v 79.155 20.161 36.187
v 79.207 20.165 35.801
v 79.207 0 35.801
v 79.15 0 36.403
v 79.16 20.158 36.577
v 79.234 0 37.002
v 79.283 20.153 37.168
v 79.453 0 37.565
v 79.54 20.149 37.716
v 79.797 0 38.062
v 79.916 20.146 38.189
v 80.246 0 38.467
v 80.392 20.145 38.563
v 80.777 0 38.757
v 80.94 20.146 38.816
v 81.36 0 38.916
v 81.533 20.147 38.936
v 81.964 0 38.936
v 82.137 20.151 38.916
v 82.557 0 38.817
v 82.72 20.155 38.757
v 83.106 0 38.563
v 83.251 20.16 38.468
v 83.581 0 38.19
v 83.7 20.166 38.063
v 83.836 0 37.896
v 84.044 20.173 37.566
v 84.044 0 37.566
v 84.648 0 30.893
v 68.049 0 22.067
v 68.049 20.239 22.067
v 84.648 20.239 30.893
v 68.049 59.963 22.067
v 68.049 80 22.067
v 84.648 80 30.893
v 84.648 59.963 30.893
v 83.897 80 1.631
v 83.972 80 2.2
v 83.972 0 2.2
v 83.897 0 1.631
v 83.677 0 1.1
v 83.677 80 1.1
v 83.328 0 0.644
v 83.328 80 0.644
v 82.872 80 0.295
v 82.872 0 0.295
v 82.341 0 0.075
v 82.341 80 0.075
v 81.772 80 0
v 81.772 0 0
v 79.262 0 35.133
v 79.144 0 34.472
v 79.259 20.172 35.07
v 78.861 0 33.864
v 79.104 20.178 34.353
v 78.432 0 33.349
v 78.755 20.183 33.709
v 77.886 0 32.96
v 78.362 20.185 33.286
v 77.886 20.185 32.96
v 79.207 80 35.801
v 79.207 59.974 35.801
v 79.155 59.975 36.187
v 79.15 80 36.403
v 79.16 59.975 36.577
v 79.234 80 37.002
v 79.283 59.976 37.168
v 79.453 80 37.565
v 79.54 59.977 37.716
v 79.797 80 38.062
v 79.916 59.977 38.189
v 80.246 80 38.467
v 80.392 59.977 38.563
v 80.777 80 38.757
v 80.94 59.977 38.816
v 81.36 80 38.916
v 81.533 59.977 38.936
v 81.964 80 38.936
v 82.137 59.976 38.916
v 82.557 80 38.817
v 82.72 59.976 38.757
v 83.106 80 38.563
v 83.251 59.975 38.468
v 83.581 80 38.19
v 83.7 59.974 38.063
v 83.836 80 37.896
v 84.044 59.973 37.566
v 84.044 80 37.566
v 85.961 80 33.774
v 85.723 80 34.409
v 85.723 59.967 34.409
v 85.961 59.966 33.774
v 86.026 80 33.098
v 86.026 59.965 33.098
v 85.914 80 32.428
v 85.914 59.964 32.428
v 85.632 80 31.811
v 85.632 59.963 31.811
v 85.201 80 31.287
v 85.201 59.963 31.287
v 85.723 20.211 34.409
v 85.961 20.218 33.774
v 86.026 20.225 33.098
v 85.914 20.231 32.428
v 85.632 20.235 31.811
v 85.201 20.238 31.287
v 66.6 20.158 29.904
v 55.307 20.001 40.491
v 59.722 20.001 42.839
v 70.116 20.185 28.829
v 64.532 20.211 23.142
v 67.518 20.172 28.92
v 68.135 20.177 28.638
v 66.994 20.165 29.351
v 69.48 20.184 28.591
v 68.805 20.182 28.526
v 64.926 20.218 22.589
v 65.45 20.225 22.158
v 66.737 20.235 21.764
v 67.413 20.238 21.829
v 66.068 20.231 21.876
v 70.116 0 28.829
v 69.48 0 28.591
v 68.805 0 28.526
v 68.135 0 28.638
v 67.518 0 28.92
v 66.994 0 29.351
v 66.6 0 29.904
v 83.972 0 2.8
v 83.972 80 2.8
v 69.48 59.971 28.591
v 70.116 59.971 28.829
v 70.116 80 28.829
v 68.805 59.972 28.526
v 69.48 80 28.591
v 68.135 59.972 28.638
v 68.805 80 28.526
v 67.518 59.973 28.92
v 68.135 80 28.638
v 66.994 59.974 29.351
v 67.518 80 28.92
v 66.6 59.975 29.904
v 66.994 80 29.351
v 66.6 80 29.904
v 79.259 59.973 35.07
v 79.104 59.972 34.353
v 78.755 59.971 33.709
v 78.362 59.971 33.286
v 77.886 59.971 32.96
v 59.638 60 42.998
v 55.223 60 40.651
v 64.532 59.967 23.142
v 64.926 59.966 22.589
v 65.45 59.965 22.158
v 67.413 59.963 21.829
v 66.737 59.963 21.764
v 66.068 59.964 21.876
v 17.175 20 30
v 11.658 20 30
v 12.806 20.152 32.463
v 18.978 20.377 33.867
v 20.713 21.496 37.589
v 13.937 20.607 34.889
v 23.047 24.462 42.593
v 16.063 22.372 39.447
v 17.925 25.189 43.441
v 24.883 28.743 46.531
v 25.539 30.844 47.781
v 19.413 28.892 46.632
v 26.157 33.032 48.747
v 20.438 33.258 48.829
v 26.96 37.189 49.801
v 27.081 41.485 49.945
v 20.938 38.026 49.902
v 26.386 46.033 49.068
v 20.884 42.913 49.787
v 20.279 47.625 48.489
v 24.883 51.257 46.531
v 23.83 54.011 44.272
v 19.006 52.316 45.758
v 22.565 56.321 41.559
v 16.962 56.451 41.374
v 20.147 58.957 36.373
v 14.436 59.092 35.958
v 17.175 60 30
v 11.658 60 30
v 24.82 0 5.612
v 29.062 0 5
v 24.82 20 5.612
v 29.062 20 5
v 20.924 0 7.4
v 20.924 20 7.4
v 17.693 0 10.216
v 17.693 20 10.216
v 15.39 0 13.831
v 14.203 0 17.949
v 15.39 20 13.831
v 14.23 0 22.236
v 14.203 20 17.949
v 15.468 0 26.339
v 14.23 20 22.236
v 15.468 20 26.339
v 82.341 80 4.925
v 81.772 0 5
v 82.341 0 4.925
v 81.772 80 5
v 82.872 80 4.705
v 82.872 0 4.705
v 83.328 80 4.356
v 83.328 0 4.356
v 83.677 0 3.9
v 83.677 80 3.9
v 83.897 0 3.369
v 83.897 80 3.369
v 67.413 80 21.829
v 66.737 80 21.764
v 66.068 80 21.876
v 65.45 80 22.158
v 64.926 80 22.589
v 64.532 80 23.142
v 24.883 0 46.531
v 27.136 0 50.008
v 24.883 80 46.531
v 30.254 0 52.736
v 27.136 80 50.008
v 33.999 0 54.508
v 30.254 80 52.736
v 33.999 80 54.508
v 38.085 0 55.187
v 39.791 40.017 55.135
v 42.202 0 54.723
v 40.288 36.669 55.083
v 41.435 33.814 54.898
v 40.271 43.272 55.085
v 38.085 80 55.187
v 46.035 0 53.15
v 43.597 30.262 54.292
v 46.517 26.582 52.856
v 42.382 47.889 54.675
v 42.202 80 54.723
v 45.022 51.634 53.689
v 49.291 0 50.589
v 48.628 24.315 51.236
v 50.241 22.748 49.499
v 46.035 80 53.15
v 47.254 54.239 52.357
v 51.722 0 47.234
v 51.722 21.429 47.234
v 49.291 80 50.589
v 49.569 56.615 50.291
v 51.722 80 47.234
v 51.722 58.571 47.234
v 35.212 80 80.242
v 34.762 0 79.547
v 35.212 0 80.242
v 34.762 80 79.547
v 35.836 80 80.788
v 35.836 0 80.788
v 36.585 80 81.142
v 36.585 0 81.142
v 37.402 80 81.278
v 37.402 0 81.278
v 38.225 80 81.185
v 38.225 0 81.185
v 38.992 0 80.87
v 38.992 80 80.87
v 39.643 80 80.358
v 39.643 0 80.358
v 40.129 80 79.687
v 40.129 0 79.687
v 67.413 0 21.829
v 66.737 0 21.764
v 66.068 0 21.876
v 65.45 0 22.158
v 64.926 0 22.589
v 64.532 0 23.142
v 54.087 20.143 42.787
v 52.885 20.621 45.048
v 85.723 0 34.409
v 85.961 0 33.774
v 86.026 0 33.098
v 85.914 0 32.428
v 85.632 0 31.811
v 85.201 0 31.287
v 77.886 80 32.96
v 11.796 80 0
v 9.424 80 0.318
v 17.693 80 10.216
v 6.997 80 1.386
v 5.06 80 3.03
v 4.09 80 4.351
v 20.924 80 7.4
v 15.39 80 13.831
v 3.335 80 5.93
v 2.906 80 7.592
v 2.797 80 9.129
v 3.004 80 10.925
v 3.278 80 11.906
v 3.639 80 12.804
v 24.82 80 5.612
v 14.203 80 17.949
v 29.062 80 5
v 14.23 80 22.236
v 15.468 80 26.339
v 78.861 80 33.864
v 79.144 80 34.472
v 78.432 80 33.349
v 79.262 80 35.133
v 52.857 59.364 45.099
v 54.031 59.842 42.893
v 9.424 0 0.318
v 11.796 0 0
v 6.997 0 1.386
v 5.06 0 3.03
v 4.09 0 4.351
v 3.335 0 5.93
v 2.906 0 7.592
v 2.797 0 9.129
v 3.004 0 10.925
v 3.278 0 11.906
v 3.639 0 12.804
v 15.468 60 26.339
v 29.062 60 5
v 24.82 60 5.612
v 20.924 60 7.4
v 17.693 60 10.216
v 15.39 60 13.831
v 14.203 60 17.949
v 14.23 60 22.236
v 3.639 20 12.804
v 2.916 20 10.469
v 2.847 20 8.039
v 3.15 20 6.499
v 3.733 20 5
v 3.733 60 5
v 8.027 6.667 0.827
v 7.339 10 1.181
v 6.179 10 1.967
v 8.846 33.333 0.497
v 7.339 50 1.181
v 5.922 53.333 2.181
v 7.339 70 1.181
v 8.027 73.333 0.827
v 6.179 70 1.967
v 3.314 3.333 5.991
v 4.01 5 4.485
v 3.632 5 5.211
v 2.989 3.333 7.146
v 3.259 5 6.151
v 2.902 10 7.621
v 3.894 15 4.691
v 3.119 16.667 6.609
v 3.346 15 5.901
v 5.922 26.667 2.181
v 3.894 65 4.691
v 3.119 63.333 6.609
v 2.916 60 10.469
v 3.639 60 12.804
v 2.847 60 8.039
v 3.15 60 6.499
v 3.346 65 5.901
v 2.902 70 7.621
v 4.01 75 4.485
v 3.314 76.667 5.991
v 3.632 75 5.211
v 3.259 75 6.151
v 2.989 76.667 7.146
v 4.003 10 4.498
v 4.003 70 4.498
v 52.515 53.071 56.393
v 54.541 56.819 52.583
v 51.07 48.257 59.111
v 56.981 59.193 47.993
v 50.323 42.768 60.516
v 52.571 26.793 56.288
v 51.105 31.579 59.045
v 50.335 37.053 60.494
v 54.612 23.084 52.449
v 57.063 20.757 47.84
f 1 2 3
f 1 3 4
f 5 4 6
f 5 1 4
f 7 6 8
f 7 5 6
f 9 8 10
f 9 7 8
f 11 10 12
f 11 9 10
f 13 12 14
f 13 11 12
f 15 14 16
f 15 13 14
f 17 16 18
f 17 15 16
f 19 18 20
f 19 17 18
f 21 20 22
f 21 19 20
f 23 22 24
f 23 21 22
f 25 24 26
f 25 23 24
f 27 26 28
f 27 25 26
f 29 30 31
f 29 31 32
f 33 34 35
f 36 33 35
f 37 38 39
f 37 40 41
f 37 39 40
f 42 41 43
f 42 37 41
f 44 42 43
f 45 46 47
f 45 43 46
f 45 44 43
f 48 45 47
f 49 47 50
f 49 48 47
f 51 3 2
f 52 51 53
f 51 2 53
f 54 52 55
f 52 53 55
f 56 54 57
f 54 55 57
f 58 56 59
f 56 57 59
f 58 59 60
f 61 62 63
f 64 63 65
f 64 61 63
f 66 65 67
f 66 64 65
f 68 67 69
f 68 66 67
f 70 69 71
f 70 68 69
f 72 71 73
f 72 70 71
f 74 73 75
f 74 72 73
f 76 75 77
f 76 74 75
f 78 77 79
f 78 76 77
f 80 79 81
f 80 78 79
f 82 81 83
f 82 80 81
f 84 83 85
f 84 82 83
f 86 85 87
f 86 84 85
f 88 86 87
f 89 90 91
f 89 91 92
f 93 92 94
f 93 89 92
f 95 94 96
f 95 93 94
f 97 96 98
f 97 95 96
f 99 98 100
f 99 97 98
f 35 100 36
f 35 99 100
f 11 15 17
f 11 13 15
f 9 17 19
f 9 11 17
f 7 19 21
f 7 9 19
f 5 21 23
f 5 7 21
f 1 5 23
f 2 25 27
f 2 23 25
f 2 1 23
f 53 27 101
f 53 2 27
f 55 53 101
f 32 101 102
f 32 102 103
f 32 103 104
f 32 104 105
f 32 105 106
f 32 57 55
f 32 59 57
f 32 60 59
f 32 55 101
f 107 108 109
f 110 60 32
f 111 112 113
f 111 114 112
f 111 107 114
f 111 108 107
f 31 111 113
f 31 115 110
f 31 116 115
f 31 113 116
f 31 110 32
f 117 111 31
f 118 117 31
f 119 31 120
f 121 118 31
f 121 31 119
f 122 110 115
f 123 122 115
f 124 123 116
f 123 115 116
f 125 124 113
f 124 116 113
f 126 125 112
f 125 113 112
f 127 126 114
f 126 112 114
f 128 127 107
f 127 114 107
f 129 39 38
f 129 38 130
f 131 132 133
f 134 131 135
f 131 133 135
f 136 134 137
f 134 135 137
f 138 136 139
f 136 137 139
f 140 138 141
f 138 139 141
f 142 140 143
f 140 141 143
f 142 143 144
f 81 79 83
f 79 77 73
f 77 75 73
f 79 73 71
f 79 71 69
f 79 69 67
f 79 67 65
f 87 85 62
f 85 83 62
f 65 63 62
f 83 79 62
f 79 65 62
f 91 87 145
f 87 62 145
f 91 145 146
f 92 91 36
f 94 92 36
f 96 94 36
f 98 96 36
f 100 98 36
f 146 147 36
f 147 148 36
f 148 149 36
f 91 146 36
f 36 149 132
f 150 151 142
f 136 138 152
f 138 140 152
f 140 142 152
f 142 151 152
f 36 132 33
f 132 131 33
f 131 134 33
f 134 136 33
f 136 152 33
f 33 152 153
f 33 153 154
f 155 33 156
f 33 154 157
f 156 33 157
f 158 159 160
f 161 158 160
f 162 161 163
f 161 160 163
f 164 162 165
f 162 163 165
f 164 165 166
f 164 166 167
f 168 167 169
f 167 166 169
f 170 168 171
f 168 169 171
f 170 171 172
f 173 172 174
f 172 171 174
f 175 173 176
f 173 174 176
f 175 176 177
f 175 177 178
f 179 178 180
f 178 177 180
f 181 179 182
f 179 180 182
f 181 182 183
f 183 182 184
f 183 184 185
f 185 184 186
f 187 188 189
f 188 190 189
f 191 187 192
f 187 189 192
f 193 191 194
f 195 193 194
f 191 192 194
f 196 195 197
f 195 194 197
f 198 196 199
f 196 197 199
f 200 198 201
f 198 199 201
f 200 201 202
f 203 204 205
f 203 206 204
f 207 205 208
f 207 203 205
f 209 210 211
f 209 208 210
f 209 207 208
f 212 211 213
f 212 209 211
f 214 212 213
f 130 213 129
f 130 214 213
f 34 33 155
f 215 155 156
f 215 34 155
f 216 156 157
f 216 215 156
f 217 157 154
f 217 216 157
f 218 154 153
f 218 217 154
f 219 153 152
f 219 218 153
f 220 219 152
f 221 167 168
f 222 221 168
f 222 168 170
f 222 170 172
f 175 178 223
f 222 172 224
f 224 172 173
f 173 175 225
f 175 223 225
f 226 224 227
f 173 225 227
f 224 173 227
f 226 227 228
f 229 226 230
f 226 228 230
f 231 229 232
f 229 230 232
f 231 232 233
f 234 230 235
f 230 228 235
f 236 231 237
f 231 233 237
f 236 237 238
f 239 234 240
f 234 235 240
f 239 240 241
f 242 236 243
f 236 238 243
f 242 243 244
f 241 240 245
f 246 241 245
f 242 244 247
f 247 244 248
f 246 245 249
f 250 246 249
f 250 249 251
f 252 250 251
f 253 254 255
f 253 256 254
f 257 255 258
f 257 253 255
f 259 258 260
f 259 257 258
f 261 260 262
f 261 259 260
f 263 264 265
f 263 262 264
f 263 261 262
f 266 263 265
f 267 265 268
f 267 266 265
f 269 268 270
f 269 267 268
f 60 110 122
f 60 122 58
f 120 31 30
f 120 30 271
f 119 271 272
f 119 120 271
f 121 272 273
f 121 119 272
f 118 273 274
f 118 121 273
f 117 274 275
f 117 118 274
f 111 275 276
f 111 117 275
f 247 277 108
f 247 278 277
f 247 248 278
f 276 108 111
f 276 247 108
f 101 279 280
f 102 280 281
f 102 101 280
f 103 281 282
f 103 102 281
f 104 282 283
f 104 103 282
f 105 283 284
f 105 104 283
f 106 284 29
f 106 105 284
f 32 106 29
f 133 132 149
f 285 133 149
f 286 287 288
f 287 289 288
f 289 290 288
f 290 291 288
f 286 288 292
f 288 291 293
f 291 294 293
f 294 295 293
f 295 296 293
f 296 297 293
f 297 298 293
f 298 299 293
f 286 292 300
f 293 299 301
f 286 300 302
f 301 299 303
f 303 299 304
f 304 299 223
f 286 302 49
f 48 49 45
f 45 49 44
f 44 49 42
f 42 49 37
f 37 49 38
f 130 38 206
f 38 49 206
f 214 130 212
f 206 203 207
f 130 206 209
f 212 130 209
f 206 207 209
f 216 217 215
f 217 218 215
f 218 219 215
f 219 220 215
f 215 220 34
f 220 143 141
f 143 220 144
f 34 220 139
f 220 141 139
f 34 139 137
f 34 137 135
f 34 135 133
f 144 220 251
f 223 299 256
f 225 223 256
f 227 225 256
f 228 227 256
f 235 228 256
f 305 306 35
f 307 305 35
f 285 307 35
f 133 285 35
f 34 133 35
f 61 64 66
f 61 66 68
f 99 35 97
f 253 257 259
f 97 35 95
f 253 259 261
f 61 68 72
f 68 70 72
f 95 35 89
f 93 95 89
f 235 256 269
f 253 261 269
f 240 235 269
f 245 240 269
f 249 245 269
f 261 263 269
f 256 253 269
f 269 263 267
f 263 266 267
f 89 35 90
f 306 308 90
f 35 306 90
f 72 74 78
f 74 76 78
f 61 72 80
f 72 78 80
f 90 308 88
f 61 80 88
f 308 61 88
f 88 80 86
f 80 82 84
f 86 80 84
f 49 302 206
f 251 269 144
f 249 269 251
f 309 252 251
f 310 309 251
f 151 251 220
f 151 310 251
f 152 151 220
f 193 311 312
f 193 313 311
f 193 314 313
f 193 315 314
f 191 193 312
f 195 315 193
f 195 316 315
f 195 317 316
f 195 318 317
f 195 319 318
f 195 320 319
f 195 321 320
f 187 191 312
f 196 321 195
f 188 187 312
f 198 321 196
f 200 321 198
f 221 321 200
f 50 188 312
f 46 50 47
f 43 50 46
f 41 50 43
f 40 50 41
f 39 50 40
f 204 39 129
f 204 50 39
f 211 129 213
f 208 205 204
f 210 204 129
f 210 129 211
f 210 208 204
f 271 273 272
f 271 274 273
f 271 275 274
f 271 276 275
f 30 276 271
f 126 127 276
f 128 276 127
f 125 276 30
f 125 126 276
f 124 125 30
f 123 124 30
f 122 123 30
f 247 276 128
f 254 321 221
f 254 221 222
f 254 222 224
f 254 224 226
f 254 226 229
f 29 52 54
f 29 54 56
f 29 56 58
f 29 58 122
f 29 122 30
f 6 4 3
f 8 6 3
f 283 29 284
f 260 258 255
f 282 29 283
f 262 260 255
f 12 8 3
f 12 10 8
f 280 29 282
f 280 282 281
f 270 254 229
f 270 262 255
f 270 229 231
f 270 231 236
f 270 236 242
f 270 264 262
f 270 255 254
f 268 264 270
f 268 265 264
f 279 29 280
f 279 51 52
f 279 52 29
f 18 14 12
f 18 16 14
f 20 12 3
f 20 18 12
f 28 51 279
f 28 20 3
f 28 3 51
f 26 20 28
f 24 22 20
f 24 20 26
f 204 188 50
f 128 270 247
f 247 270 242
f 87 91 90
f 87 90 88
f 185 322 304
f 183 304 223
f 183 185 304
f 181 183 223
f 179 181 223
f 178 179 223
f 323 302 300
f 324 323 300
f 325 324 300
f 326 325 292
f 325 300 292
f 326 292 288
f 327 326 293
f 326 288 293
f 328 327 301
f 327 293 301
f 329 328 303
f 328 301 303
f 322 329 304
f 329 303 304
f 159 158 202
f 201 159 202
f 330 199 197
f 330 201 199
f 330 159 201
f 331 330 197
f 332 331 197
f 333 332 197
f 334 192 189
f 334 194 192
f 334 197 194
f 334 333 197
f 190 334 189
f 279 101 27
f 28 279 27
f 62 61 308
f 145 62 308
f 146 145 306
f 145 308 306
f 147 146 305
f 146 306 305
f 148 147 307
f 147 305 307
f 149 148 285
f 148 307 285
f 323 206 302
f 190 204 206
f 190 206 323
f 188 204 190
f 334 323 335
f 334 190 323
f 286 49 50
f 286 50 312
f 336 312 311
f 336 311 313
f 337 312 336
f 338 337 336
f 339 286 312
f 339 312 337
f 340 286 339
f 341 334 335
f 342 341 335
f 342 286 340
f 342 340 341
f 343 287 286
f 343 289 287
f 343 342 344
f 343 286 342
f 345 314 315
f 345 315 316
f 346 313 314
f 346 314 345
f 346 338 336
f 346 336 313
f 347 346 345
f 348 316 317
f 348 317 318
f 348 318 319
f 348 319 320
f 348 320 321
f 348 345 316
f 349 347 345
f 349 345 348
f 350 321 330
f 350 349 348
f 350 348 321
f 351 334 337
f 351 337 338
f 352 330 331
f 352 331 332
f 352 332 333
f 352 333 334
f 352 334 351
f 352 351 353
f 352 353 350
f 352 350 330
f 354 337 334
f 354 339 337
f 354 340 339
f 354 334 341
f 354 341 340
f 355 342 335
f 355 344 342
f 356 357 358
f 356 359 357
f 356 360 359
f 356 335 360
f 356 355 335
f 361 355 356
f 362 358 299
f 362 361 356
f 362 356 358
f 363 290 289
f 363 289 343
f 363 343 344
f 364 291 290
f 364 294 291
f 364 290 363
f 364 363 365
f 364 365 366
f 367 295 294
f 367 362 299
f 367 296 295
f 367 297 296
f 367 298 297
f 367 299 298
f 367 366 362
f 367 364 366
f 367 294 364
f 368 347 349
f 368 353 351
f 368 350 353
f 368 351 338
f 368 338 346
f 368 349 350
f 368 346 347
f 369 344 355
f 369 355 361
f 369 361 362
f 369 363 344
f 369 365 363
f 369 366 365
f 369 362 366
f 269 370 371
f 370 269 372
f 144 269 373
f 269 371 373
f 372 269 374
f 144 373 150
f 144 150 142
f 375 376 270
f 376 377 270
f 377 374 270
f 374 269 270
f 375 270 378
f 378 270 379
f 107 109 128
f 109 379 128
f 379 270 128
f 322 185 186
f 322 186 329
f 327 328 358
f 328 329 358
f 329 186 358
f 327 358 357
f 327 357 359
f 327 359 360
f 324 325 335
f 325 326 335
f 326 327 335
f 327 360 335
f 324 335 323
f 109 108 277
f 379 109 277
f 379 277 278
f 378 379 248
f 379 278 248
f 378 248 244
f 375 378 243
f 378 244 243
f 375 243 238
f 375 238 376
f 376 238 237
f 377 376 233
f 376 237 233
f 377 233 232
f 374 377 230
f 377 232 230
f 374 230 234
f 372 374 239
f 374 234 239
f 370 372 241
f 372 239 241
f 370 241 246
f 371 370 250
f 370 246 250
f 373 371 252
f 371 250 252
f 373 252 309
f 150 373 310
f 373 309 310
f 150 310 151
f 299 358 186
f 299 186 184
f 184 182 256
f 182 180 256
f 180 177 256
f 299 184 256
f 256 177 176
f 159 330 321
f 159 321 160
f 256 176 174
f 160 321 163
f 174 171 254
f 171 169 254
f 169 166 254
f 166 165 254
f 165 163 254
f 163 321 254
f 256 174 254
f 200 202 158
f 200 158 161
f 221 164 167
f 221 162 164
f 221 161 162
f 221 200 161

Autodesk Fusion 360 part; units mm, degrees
sketch "Schizzo1" plane through (0, 0, 0) normal (0, 0, 1) x (1, 0, 0)
  line L0 (0, 0) -> (90, 0)
  line L1 (90, 0) -> (90, 80)
  line L2 (90, 80) -> (0, 80)
  line L3 (0, 80) -> (0, 0)
  dimension "d1" = 90
  dimension "d2" = 80
extrude "Estrusione1" add sketch "Schizzo1" along normal blind 85
sketch "Schizzo2" plane through (0, 0, 0) normal (0, -1, 0) x (1, 0, 0)
  line L0 (0, 0) -> (90, 0)
  line L1 (90, 0) -> (90, 85)
  line L2 (90, 85) -> (0, 85)
  line L3 (0, 85) -> (0, 0)
  line L4 (90, 0) -> (90, 5)
  line L5 (90, 5) -> (0, 5)
  line L6 (0, 5) -> (0, 0)
  line L7 (0, 0) -> (90, 0)
  line L8 (0, 5) -> (37.3046, 85)
  line L9 (0, 5) -> (76.1109, 5) construction
  line L10 (37.3046, 85) -> (67.8203, 27.6084)
  line L11 (67.8203, 27.6084) -> (80.1815, 34.181)
  line L12 (80.1815, 34.181) -> (77.8342, 38.5957)
  line L13 (4.5315, 2.8869) -> (37.5979, 73.798)
  line L14 (37.5979, 73.798) -> (65.7529, 20.8463)
  line L15 (65.7529, 20.8463) -> (86.9436, 32.1136)
  line L16 (86.9436, 32.1136) -> (82.2489, 40.9431)
  line L17 (77.8342, 38.5957) -> (82.2489, 40.9431)
  line L18 (0, 5) -> (-2.3315, 0)
  line L19 (0, 0) -> (-2.3315, 0)
  dimension "d5" = 5
  dimension "d6" = 65
  dimension "d8" = 53
  dimension "d9" = 65
  dimension "d10" = 14
  dimension "d11" = 5
  dimension "d12" = 5
extrude "Estrusione2" cut sketch "Schizzo2" against normal blind 80 contours L2 L3 L8 | L1 L2 L5 L10 L11 L12 L13 L14 L15 L16 L17
fillet "Raccordo1" radius 15 1 edges at (5.5169, 40, 5)
fillet "Raccordo2" radius 15 1 edges at (37.5979, 40, 73.798)
fillet "Raccordo3" radius 2.6 6 edges at (80.1815, 40, 34.181) (77.8342, 40, 38.5957) (82.2489, 40, 40.9431) (67.8203, 40, 27.6084) (86.9436, 40, 32.1136) (65.7529, 40, 20.8463)
fillet "Raccordo4" radius 3 1 edges at (37.3046, 40, 85)
sketch "Schizzo3" plane through (0, 0, 0) normal (0, -1, 0) x (1, 0, 0)
  arc A0 (15.4676, 26.3393) -> (29.0622, 5) centre (29.0622, 20) ccw
  line L0 (15.4676, 26.3393) -> (24.8833, 46.5315)
  arc A1 (51.7222, 47.2343) -> (24.8833, 46.5315) centre (38.4779, 40.1922) ccw
  line L1 (51.7222, 47.2343) -> (64.5323, 23.142)
  arc A2 (64.5323, 23.142) -> (68.0485, 22.0669) centre (66.8279, 24.3626) ccw
  line L2 (68.0485, 22.0669) -> (84.648, 30.893)
  arc A3 (84.648, 30.893) -> (85.723, 34.4093) centre (83.4273, 33.1887) ccw
  line L3 (85.723, 34.4093) -> (84.0462, 37.5629)
  arc A4 (84.0462, 37.5629) -> (79.2079, 35.7992) centre (81.7505, 36.3423) ccw
  arc A5 (77.8859, 32.9604) -> (79.2079, 35.7992) centre (76.6652, 35.256) ccw
  line L4 (77.8859, 32.9604) -> (70.1159, 28.829)
  arc A6 (66.5996, 29.9041) -> (70.1159, 28.829) centre (68.8953, 31.1247) ccw
  line L5 (66.5996, 29.9041) -> (40.1295, 79.6872)
  arc A7 (40.1295, 79.6872) -> (34.7617, 79.5467) centre (37.4806, 78.2788) ccw
  line L6 (34.7617, 79.5467) -> (0, 5)
  line L7 (0, 5) -> (0, 0)
  line L8 (0, 0) -> (90, 0)
  line L9 (0, 5) -> (-2.8175, -1.0421)
  line L10 (0, 0) -> (-2.3315, 0)
  line L11 (90, 0) -> (90, 5)
  line L12 (90, 5) -> (29.0622, 5)
extrude "Estrusione3" add sketch "Schizzo3" against normal blind 80 contours L7 L9 L10
fillet "Raccordo6" radius 9 1 edges at (-2.3315, 40, 0)
sketch "Schizzo4" plane through (0, 0, 0) normal (0, -1, 0) x (1, 0, 0)
  arc A0 (3.6389, 12.8036) -> (11.7956, 0) centre (11.7956, 9) ccw
  line L0 (11.7956, 0) -> (90, 0)
  line L1 (90, 0) -> (90, 5)
  line L2 (90, 5) -> (29.0622, 5)
  arc A1 (15.4676, 26.3393) -> (29.0622, 5) centre (29.0622, 20) ccw
  line L3 (15.4676, 26.3393) -> (24.8833, 46.5315)
  arc A2 (51.7222, 47.2343) -> (24.8833, 46.5315) centre (38.4779, 40.1922) ccw
  line L4 (51.7222, 47.2343) -> (64.5323, 23.142)
  arc A3 (64.5323, 23.142) -> (68.0485, 22.0669) centre (66.8279, 24.3626) ccw
  line L5 (68.0485, 22.0669) -> (84.648, 30.893)
  arc A4 (84.648, 30.893) -> (85.723, 34.4093) centre (83.4273, 33.1887) ccw
  line L6 (85.723, 34.4093) -> (84.0462, 37.5629)
  arc A5 (84.0462, 37.5629) -> (79.2079, 35.7992) centre (81.7505, 36.3423) ccw
  arc A6 (77.8859, 32.9604) -> (79.2079, 35.7992) centre (76.6652, 35.256) ccw
  line L7 (77.8859, 32.9604) -> (70.1159, 28.829)
  arc A7 (66.5996, 29.9041) -> (70.1159, 28.829) centre (68.8953, 31.1247) ccw
  line L8 (66.5996, 29.9041) -> (40.1295, 79.6872)
  arc A8 (40.1295, 79.6872) -> (34.7617, 79.5467) centre (37.4806, 78.2788) ccw
  line L9 (34.7617, 79.5467) -> (3.6389, 12.8036)
  line L10 (100, -5) -> (83.9719, -5)
  line L11 (83.9719, -5) -> (83.9719, 13.2417)
  line L12 (83.9719, 13.2417) -> (100, 13.2417)
  line L13 (100, 13.2417) -> (100, -5)
extrude "Estrusione4" cut sketch "Schizzo4" against normal blind 80 contours L0 L1 L2 L11
fillet "Raccordo7" radius 2.2 2 edges at (83.9719, 40, 5) (83.9719, 40, 0)
sketch "Schizzo5" plane through (64.3166, 0, 34.1978) normal (0.8829, 0, 0.4695) x (0, 1, 0)
  line L0 (80, 51.52) -> (0, 51.52)
  line L1 (0, 51.52) -> (0, -4.8629)
  line L2 (0, -4.8629) -> (80, -4.8629)
  line L3 (80, -4.8629) -> (80, 51.52)
  circle A0 centre (40, 10) radius 20
  line L4 (20.0011, 9.7863) -> (20.3194, -19.9984)
  line L5 (60, 9.9667) -> (59.9501, -19.9992)
  line L6 (59.9501, -19.9992) -> (20.3194, -19.9984)
  line L7 (0, 0) -> (0, 10)
  line L8 (0, 10) -> (40, 10)
  dimension "d34" = 40
  dimension "d39" = 10
  dimension "d40" = 40
extrude "Estrusione5" cut sketch "Schizzo5" along normal blind 19 and the other way blind 15 contours L2 A0 L4 L5 L6 | L2 A0 L5 | L2 A0 | L2 A0 | L2 A0 L4
sketch "Schizzo6" plane through (0, 0, 0) normal (1, 0, 0) x (0, 1, 0)
  line L0 (80, 0) -> (80, 5)
  line L1 (80, 5) -> (40, 5)
  line L2 (40, 5) -> (40, 30)
  circle A0 centre (40, 30) radius 20
  line L3 (60, 30) -> (60, 5)
  line L4 (20, 30) -> (20, 5)
  line L5 (20, 5) -> (40, 5)
  dimension "d41" = 5
  dimension "d42" = 40
  dimension "d43" = 25
  dimension "d44" = 40
extrude "Estrusione6" cut sketch "Schizzo6" along normal blind 30
